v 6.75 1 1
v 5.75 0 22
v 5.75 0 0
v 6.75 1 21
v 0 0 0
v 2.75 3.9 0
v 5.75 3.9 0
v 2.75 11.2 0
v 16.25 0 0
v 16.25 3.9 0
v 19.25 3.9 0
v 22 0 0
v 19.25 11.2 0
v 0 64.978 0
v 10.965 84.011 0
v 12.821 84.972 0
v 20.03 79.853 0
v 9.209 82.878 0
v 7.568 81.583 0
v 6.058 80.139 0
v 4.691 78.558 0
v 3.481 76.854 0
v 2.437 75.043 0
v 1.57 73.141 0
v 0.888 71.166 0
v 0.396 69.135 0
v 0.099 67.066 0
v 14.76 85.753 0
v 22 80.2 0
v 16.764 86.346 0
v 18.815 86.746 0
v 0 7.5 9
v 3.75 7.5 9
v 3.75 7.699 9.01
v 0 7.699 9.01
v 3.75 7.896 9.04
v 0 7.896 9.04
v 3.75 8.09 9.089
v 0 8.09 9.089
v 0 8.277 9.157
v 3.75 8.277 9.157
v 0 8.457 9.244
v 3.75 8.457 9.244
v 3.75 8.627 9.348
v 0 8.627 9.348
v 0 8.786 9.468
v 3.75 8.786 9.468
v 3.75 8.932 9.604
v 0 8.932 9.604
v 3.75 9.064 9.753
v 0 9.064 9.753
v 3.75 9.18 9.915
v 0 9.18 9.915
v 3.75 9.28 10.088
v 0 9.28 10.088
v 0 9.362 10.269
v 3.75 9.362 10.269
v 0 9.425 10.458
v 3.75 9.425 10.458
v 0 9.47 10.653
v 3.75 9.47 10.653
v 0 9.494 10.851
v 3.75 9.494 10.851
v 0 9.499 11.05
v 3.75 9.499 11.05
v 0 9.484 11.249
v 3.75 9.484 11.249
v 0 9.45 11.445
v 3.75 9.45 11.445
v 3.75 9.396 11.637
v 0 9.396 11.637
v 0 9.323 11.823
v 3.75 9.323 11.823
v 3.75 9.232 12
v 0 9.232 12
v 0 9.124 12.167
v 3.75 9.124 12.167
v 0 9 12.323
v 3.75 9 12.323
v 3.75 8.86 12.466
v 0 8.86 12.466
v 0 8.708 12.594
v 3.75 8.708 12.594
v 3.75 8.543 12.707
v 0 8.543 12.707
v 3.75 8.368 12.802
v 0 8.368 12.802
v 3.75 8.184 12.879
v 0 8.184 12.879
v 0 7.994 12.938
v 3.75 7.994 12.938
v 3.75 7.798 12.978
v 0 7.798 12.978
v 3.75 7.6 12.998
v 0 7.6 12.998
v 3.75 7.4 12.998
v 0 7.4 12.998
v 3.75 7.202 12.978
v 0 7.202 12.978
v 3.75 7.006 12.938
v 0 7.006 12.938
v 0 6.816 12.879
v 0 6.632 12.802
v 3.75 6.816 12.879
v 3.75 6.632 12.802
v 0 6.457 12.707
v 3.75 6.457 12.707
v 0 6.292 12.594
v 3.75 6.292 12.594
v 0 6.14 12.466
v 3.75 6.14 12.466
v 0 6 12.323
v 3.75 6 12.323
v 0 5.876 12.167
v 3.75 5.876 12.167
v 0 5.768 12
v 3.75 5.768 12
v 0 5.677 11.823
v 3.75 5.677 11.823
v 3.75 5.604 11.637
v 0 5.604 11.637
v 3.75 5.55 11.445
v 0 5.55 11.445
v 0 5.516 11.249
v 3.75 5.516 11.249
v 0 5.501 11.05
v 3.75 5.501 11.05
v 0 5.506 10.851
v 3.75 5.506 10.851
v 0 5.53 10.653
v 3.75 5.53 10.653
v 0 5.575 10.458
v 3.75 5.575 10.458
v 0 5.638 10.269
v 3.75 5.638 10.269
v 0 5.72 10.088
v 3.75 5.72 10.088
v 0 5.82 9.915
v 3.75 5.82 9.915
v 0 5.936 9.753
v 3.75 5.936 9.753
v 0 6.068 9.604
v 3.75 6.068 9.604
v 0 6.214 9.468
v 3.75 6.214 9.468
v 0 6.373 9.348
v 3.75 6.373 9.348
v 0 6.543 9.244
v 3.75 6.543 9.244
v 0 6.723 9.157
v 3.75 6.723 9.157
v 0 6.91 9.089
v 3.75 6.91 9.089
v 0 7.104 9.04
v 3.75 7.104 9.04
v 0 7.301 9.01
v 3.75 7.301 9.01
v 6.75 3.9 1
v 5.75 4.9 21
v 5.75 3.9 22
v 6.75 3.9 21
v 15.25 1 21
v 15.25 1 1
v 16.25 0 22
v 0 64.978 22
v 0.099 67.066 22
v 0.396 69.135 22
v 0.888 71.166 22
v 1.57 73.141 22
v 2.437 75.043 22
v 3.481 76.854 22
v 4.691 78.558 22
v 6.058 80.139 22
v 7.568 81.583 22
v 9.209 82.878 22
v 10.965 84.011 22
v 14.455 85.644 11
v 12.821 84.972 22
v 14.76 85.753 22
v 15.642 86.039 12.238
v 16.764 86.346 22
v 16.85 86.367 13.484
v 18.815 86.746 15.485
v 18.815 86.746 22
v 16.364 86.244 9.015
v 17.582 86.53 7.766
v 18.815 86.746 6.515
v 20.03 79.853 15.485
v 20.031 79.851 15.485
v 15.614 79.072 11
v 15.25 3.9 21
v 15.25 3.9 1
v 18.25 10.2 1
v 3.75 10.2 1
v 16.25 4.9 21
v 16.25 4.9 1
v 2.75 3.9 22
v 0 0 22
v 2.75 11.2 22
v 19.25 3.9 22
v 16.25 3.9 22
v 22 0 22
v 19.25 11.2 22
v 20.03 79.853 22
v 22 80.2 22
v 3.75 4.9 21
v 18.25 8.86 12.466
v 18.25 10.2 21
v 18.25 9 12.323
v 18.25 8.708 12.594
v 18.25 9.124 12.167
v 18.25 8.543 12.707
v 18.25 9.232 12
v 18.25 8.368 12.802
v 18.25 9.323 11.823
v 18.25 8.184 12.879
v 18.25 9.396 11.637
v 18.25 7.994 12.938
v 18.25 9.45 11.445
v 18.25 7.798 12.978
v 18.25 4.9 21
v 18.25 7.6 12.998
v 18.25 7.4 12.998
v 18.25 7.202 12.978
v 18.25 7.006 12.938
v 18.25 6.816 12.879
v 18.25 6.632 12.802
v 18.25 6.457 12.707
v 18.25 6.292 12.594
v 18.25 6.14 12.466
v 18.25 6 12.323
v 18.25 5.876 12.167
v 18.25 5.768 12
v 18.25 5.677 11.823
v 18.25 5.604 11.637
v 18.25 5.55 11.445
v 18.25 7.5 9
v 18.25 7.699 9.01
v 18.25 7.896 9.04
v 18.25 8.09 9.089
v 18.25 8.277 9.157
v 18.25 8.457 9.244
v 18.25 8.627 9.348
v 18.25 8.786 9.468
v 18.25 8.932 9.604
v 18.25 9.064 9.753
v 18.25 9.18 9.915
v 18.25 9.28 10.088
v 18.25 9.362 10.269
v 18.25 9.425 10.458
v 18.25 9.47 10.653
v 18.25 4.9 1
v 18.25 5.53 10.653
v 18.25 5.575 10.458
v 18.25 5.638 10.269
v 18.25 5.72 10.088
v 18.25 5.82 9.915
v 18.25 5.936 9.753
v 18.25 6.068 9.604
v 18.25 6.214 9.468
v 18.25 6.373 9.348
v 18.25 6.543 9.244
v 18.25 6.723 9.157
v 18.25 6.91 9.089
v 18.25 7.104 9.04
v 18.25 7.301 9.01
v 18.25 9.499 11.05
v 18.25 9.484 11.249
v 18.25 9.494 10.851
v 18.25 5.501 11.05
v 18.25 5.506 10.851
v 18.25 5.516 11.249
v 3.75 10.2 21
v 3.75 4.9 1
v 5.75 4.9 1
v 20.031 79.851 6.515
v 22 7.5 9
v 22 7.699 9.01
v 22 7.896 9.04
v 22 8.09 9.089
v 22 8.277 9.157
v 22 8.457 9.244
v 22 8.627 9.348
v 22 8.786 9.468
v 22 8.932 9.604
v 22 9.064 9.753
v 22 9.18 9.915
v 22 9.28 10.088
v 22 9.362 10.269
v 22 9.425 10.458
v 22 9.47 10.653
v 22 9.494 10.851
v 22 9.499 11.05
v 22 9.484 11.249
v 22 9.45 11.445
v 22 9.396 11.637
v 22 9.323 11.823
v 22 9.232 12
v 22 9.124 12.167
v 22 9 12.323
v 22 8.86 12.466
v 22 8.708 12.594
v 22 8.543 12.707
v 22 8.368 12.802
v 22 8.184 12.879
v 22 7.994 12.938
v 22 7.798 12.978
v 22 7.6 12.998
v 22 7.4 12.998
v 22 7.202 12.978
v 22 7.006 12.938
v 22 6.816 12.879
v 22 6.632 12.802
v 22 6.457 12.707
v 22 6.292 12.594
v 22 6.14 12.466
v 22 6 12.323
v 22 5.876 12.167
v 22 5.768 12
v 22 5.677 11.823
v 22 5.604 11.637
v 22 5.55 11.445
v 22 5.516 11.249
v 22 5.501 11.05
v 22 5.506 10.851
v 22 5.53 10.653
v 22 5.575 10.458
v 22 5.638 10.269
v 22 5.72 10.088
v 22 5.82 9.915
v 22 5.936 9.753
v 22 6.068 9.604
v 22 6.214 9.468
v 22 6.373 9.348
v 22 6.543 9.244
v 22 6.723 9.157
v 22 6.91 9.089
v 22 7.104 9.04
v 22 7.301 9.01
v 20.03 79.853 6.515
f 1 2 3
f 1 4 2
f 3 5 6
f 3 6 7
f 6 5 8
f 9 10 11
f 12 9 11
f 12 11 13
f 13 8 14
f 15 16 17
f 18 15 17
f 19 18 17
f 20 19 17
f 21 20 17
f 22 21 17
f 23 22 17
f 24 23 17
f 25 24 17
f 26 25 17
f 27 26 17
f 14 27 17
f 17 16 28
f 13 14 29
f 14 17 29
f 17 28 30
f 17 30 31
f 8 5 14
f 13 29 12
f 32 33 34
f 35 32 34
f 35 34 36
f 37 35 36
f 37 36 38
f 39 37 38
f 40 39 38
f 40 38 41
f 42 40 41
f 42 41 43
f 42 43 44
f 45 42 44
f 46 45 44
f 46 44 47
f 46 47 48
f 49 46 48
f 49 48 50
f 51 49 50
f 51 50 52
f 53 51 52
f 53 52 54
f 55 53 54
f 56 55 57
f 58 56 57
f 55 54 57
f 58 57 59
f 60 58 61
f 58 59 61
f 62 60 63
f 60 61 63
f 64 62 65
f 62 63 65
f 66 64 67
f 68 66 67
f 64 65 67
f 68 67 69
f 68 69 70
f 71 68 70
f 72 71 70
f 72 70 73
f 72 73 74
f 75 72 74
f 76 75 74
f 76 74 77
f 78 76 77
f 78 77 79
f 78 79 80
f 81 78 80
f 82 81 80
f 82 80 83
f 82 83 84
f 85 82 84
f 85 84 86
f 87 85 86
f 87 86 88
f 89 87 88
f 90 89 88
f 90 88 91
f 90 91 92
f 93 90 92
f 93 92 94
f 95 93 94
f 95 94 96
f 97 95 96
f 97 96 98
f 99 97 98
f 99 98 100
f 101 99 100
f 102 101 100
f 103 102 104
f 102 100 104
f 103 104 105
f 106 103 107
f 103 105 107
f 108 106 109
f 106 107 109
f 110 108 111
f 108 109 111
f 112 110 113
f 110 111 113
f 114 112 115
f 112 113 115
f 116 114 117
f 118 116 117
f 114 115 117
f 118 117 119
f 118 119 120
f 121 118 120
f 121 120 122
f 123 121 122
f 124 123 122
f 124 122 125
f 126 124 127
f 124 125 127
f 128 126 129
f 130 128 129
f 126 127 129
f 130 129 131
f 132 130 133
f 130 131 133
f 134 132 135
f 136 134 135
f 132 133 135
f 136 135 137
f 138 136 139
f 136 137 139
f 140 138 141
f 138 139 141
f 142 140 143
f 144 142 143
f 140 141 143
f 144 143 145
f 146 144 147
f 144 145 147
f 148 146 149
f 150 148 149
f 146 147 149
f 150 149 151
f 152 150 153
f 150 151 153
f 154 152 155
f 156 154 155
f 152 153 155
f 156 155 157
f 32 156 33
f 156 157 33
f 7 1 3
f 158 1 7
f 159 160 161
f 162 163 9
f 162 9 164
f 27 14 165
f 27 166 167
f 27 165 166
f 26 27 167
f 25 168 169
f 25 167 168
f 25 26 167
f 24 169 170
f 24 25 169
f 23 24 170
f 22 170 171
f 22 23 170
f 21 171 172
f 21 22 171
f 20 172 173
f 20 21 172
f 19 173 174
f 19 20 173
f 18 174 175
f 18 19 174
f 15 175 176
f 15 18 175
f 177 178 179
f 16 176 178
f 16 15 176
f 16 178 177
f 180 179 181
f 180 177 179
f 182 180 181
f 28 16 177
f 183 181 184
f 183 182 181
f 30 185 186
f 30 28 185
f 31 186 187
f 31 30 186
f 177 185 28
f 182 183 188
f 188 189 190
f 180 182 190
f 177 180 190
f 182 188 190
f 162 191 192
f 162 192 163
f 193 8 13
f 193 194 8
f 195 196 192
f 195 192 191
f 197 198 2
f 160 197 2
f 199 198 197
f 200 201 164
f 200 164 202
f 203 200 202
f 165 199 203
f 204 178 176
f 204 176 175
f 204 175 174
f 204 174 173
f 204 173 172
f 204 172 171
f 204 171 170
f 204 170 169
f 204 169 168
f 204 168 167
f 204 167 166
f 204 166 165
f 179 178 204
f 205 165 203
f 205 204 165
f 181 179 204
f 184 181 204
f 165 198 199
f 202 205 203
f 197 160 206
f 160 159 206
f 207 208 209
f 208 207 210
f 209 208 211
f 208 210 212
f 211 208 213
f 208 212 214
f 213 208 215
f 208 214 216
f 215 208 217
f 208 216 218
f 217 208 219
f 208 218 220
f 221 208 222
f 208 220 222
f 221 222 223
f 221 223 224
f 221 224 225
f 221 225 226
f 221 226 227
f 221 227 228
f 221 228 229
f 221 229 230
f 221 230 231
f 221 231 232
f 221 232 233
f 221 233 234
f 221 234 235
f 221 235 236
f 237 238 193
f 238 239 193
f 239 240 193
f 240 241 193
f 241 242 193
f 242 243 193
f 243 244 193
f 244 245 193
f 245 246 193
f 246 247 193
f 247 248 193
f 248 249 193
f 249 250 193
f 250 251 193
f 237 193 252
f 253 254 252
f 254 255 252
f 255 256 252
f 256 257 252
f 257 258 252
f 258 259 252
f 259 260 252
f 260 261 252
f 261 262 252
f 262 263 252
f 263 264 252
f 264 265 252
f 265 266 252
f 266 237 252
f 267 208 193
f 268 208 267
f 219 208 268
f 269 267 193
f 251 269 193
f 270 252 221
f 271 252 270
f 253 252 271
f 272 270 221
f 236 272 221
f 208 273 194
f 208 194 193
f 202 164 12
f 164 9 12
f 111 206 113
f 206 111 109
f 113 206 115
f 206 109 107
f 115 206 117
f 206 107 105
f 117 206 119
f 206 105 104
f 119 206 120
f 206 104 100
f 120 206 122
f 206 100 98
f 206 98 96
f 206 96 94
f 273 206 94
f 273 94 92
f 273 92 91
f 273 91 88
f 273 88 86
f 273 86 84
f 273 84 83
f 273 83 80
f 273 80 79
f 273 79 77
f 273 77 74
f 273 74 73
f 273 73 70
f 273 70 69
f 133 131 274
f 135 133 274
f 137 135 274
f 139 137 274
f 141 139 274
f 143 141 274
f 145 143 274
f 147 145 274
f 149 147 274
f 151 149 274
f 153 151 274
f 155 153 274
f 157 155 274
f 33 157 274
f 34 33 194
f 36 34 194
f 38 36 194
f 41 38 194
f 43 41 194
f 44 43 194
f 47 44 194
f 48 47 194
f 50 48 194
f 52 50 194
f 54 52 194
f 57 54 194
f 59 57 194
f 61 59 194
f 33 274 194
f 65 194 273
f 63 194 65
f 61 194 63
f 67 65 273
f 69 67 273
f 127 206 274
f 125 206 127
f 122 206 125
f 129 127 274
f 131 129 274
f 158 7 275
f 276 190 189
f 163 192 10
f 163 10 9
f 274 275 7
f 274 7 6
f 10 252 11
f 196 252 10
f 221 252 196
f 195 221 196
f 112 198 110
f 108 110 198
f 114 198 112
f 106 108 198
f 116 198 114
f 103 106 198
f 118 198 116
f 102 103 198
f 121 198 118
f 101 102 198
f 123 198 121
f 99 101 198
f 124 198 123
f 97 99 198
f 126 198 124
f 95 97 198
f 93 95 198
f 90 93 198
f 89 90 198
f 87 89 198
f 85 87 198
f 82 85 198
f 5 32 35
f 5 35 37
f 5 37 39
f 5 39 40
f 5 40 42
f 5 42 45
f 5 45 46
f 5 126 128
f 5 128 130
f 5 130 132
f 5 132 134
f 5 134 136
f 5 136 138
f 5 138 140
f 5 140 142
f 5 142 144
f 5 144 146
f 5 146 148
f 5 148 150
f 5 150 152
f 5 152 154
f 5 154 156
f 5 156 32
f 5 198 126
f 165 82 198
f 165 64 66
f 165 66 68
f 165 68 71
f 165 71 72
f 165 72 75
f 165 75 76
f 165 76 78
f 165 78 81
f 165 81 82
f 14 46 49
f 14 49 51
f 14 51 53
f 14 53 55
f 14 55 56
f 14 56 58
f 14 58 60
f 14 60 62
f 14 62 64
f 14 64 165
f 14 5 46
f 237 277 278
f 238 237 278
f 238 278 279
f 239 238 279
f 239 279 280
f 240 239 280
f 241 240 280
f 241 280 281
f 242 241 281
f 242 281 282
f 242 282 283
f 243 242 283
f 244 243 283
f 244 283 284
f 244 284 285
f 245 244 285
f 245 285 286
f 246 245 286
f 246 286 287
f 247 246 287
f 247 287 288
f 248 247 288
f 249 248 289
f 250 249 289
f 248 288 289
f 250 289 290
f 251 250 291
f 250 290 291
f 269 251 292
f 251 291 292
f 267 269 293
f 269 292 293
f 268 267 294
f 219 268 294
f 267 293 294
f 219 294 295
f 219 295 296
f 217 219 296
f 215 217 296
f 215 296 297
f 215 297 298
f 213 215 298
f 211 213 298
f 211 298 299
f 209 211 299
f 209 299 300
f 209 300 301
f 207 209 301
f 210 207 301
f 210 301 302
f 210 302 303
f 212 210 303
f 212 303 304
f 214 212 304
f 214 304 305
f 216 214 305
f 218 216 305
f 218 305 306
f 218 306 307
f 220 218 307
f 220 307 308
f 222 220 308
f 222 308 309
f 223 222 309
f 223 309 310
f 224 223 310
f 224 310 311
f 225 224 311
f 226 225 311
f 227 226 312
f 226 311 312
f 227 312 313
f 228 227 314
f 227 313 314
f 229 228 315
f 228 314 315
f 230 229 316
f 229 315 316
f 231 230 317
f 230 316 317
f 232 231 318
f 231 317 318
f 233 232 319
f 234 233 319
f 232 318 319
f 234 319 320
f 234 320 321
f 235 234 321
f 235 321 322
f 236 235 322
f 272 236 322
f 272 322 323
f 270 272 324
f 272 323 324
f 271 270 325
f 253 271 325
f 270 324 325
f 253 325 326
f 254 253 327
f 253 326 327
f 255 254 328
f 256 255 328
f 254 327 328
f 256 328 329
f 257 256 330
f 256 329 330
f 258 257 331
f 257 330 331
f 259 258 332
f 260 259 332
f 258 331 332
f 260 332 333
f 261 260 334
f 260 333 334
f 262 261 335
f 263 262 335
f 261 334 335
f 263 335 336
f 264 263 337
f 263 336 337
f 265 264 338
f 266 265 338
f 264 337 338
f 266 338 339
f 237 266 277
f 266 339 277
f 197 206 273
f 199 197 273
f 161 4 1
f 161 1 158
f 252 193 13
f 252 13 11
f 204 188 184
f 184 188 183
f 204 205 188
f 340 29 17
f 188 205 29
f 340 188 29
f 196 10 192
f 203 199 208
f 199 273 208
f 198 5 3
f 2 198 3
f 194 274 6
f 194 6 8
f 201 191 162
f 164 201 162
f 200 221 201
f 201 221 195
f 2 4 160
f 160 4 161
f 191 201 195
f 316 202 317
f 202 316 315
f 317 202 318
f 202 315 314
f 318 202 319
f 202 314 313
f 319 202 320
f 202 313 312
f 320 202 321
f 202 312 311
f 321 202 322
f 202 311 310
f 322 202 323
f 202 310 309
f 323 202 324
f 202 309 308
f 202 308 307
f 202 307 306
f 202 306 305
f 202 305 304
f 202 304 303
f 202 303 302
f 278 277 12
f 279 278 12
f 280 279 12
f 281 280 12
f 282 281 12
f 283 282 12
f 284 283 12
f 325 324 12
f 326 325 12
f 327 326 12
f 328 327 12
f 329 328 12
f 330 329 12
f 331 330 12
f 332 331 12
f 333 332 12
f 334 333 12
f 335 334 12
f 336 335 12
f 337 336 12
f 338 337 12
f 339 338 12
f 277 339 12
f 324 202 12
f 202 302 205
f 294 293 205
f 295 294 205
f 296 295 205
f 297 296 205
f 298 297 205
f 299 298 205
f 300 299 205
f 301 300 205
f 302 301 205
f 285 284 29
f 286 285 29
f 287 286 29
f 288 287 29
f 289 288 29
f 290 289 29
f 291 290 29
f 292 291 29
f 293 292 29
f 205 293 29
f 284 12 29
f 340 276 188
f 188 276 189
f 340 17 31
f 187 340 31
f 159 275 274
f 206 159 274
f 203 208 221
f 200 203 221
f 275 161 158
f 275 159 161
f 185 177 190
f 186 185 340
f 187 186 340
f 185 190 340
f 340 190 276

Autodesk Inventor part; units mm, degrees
ref_plane "YZ Plane" through (0, 0, 0) normal (1, 0, 0) x (0, 1, 0)
ref_plane "XZ Plane" through (0, 0, 0) normal (0, 1, 0) x (-1, 0, 0)
ref_plane "XY Plane" through (0, 0, 0) normal (0, 0, 1) x (1, 0, 0)
sketch "Skizze1" plane through (0, 0, 0) normal (0, 0, 1) x (1, 0, 0)
  line L0 (0, 0) -> (6.75, 0)
  line L1 (6.75, 0) -> (6.75, 4.9)
  line L2 (6.75, 4.9) -> (3.75, 4.9)
  line L3 (3.75, 4.9) -> (3.75, 10.2)
  line L4 (3.75, 10.2) -> (18.25, 10.2)
  line L5 (18.25, 10.2) -> (18.25, 4.9)
  line L6 (18.25, 4.9) -> (15.25, 4.9)
  line L7 (15.25, 4.9) -> (15.25, 0)
  line L8 (15.25, 0) -> (22, 0)
  line L9 (22, 0) -> (22, 80.2)
  line L10 (0, 0) -> (0, 64.9782)
  line L11 (22, 80.2) -> (22, 98.8308) construction
  line L12 (22, 80.2) -> (20.0304, 79.8527)
  line L13 (20.0304, 79.8527) -> (18.8148, 86.7464)
  arc A0 (22, 86.9782) -> (18.8148, 86.7464) centre (22, 64.9782) ccw construction
  arc A1 (18.8148, 86.7464) -> (0, 64.9782) centre (22, 64.9782) ccw
  dimension "d0" = 14.5
  dimension "d1" = 5.3
  dimension "d2" = 4.9
  dimension "d3" = 22
  dimension "d4" = 8.5
  dimension "d5" = 2
  dimension "d6" = 7
  dimension "d21" = 70
  dimension "d22" = 80
extrude "Extrusion1" add sketch "Skizze1" along normal blind 22
sketch "Skizze2" plane through (22, 0, 0) normal (1, 0, 0) x (0, 0, -1)
  circle A0 centre (-11, 7.5) radius 2
  line L0 (0, 0) -> (-22, 0) projected
  line L1 (0, 0) -> (0, 80.2) projected
  point P0 (0, 65.2)
  dimension "d10" = 4
  dimension "d11" = 7.5
  dimension "d12" = 11
extrude "Extrusion2" cut sketch "Skizze2" against normal blind 22
chamfer "Fasen1" distance 1 angle 45 18 edges at (3.75, 7.55, 22) (11, 10.2, 22) (18.25, 7.55, 22) (16.75, 4.9, 22) (5.25, 4.9, 22) (6.75, 2.45, 22) (15.25, 2.45, 22) (18.25, 7.55, 0) (15.25, 2.45, 0) (16.75, 4.9, 0) (11, 10.2, 0) (3.75, 7.55, 0) (5.25, 4.9, 0) (6.75, 2.45, 0) (6.75, 4.9, 11) (15.25, 4.9, 11) (6.75, 0, 11) (15.25, 0, 11)
sketch "Skizze3" plane through (20.0304, 79.8527, 22) normal (-0.1736, 0.9848, 0) x (0.9848, 0.1736, 0)
  circle A0 centre (4, 11) radius 6 construction
  line L0 (0, 6.5147) -> (-4.4853, 11)
  line L1 (-4.4853, 11) -> (0, 15.4853)
  line L2 (0, 15.4853) -> (0, 6.5147)
  line L3 (2, 22) -> (2, 0) projected
  line L4 (0, 22) -> (0, 0) projected
  point P0 (-33.5924, 22)
  point P1 (0, 11)
  dimension "d23" = 12
  dimension "d24" = 45
  dimension "d26" = 4
extrude "Extrusion3" cut sketch "Skizze3" along normal blind 10
properties part number "Gripper_V2_10deg"
